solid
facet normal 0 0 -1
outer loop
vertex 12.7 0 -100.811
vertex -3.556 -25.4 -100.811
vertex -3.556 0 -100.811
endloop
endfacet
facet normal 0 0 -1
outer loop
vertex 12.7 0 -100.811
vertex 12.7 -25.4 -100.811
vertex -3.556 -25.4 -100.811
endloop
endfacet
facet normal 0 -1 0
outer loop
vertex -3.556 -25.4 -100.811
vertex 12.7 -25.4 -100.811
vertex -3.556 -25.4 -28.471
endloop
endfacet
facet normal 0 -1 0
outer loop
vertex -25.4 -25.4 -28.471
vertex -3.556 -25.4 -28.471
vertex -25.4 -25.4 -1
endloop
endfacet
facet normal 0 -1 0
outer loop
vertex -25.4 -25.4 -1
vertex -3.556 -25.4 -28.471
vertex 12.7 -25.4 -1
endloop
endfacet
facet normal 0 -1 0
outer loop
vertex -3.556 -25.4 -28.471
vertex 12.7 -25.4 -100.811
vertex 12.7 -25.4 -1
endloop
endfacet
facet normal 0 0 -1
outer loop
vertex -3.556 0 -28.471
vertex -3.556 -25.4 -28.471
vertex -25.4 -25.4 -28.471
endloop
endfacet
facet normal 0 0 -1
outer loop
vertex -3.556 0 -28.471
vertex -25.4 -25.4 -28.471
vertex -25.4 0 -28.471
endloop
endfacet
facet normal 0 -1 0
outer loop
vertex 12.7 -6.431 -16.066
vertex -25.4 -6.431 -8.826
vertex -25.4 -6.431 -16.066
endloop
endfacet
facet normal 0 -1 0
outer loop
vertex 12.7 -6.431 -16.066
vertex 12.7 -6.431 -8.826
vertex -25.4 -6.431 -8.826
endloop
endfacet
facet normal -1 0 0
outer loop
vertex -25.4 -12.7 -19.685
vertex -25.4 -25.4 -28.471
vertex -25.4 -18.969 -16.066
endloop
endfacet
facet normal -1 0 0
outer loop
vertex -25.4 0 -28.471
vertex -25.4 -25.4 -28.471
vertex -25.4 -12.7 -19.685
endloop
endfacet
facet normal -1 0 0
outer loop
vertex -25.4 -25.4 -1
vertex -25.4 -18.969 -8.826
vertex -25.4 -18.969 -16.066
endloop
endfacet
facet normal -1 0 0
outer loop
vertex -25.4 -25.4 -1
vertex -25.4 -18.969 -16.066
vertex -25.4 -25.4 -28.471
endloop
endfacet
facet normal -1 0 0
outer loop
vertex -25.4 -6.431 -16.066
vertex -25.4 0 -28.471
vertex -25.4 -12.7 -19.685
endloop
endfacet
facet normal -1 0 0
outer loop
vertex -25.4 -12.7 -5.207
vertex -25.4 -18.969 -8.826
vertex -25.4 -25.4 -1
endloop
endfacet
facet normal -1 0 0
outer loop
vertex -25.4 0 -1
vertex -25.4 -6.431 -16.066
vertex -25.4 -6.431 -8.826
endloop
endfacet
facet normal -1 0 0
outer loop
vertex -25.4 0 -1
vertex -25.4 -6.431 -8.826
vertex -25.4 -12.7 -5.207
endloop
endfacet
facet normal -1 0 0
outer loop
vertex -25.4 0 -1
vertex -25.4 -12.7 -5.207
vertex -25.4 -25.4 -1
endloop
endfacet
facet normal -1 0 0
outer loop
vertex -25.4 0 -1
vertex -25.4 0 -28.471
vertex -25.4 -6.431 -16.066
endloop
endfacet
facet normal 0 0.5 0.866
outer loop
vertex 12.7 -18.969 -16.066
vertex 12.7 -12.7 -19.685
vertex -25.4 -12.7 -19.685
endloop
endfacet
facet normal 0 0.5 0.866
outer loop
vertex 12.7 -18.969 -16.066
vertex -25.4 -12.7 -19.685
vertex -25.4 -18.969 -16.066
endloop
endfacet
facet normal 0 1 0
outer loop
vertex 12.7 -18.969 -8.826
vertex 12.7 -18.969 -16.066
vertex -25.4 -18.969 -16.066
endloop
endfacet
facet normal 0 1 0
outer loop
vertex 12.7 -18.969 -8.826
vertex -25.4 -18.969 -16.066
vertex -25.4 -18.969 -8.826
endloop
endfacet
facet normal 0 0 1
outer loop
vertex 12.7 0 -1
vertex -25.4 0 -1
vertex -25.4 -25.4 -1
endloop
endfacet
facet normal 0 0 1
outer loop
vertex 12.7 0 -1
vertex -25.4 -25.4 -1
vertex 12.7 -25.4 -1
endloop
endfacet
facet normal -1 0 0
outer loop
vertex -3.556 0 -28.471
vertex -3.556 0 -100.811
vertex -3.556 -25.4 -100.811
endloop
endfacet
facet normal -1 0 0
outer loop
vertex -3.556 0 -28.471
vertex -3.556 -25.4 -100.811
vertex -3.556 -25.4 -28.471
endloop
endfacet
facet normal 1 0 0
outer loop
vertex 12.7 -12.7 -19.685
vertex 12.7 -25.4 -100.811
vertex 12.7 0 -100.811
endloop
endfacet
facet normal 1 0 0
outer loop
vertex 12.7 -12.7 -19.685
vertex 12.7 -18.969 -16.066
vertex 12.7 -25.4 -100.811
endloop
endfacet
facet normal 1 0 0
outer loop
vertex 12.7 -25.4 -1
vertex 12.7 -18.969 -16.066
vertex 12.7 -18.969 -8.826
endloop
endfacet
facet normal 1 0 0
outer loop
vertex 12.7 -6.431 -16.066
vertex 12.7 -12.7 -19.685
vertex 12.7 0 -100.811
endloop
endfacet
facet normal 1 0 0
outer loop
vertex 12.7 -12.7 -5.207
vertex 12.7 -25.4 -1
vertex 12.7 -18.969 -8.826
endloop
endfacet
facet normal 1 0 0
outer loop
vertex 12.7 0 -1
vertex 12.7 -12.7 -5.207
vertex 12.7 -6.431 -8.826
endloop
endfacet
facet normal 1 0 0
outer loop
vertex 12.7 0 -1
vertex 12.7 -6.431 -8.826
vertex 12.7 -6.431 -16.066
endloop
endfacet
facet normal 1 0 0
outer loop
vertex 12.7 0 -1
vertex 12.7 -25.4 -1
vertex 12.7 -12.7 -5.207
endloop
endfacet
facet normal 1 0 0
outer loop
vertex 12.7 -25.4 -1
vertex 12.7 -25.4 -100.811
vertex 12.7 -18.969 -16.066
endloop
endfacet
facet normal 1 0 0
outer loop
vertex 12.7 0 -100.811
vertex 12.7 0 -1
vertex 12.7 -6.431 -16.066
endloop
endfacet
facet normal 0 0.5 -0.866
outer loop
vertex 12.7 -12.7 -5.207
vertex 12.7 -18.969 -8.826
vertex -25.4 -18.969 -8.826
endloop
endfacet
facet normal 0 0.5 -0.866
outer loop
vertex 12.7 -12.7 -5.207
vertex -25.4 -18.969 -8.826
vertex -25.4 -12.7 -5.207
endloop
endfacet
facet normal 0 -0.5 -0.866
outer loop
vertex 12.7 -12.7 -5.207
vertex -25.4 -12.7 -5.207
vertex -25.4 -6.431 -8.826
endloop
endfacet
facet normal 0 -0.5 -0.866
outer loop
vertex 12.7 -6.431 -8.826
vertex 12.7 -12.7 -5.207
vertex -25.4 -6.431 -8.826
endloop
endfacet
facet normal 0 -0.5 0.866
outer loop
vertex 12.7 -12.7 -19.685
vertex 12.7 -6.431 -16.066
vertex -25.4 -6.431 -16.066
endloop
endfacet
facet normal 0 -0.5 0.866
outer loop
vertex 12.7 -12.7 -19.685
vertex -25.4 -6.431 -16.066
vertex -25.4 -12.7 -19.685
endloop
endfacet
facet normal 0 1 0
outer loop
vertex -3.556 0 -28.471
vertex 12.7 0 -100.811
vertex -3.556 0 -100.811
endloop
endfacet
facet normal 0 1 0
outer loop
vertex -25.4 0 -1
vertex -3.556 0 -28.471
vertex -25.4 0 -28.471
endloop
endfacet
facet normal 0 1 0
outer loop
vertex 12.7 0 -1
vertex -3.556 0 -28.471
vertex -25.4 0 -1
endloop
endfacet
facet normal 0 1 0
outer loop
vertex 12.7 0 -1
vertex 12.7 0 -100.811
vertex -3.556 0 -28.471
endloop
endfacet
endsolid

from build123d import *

# Parameters (mm, degrees)
SKETCH1_W           = 75.411469328
SKETCH1_H           = 25.4
BOSS_EXTRUDE1_DEPTH = 12.7
SKETCH3_W           = 12.7
SKETCH3_H           = 25.4
BOSS_EXTRUDE2_DEPTH = 25.4
SKETCH4_W           = 7.642985312
SKETCH4_H           = 25.4
BOSS_EXTRUDE4_DEPTH = 25.4
SKETCH5_W           = 72.340144766
SKETCH5_H           = 25.4
CUT_EXTRUDE1_DEPTH  = 6.604
SKETCH6_W           = 20.82833925
SKETCH6_H           = 25.4
BOSS_EXTRUDE5_DEPTH = 25.4
SKETCH7_W           = 72.340144766
SKETCH7_H           = 25.4
BOSS_EXTRUDE6_DEPTH = 10.16
SKETCH8_W           = 38.1
SKETCH8_H           = 25.4
CUT_EXTRUDE2_DEPTH  = 1


with BuildPart() as part:
    # Sketch1 → Boss-Extrude1 (new body)
    with BuildSketch(Plane(origin=(0, 0, 0), x_dir=(0, 0, -1), z_dir=(1, 0, 0))):
        with Locations((37.705734664, -12.7)):
            Rectangle(SKETCH1_W, SKETCH1_H)
        Polygon((19.685, -12.7), (16.0655, -6.430842102), (8.8265, -6.430842102), (5.207, -12.7), (8.8265, -18.969157898), (16.0655, -18.969157898), align=None, mode=Mode.SUBTRACT)
    extrude(amount=BOSS_EXTRUDE1_DEPTH)

    # Sketch3 → Boss-Extrude2 (add)
    with BuildSketch(Plane(origin=(0, 0, -75.411469328), x_dir=(-1, 0, 0), z_dir=(0, 0, -1))):
        with Locations((-6.35, -12.7)):
            Rectangle(SKETCH3_W, SKETCH3_H)
    extrude(amount=BOSS_EXTRUDE2_DEPTH)

    # Sketch4 → Boss-Extrude4 (add)
    with BuildSketch(Plane.ZY):
        with Locations((-24.649831906, -12.7)):
            Rectangle(SKETCH4_W, SKETCH4_H)
    extrude(amount=BOSS_EXTRUDE4_DEPTH)

    # Sketch5 → Cut-Extrude1 (cut)
    with BuildSketch(Plane.ZY):
        with Locations((-64.641396945, -12.7)):
            Rectangle(SKETCH5_W, SKETCH5_H)
    extrude(amount=-CUT_EXTRUDE1_DEPTH, mode=Mode.SUBTRACT)

    # Sketch6 → Boss-Extrude5 (add)
    with BuildSketch(Plane.ZY):
        with Locations((-10.414169625, -12.7)):
            Rectangle(SKETCH6_W, SKETCH6_H)
        Polygon((-8.8265, -6.430842102), (-16.0655, -6.430842102), (-19.685, -12.7), (-16.0655, -18.969157898), (-8.8265, -18.969157898), (-5.207, -12.7), align=None, mode=Mode.SUBTRACT)
    extrude(amount=BOSS_EXTRUDE5_DEPTH)

    # Sketch7 → Boss-Extrude6 (add)
    with BuildSketch(Plane.ZY.offset(-6.604)):
        with Locations((-64.641396945, -12.7)):
            Rectangle(SKETCH7_W, SKETCH7_H)
    extrude(amount=BOSS_EXTRUDE6_DEPTH)

    # Sketch8 → Cut-Extrude2 (cut)
    with BuildSketch(Plane.XY):
        with Locations((-6.35, -12.7)):
            Rectangle(SKETCH8_W, SKETCH8_H)
    extrude(amount=-CUT_EXTRUDE2_DEPTH, mode=Mode.SUBTRACT)


solid = part.part
